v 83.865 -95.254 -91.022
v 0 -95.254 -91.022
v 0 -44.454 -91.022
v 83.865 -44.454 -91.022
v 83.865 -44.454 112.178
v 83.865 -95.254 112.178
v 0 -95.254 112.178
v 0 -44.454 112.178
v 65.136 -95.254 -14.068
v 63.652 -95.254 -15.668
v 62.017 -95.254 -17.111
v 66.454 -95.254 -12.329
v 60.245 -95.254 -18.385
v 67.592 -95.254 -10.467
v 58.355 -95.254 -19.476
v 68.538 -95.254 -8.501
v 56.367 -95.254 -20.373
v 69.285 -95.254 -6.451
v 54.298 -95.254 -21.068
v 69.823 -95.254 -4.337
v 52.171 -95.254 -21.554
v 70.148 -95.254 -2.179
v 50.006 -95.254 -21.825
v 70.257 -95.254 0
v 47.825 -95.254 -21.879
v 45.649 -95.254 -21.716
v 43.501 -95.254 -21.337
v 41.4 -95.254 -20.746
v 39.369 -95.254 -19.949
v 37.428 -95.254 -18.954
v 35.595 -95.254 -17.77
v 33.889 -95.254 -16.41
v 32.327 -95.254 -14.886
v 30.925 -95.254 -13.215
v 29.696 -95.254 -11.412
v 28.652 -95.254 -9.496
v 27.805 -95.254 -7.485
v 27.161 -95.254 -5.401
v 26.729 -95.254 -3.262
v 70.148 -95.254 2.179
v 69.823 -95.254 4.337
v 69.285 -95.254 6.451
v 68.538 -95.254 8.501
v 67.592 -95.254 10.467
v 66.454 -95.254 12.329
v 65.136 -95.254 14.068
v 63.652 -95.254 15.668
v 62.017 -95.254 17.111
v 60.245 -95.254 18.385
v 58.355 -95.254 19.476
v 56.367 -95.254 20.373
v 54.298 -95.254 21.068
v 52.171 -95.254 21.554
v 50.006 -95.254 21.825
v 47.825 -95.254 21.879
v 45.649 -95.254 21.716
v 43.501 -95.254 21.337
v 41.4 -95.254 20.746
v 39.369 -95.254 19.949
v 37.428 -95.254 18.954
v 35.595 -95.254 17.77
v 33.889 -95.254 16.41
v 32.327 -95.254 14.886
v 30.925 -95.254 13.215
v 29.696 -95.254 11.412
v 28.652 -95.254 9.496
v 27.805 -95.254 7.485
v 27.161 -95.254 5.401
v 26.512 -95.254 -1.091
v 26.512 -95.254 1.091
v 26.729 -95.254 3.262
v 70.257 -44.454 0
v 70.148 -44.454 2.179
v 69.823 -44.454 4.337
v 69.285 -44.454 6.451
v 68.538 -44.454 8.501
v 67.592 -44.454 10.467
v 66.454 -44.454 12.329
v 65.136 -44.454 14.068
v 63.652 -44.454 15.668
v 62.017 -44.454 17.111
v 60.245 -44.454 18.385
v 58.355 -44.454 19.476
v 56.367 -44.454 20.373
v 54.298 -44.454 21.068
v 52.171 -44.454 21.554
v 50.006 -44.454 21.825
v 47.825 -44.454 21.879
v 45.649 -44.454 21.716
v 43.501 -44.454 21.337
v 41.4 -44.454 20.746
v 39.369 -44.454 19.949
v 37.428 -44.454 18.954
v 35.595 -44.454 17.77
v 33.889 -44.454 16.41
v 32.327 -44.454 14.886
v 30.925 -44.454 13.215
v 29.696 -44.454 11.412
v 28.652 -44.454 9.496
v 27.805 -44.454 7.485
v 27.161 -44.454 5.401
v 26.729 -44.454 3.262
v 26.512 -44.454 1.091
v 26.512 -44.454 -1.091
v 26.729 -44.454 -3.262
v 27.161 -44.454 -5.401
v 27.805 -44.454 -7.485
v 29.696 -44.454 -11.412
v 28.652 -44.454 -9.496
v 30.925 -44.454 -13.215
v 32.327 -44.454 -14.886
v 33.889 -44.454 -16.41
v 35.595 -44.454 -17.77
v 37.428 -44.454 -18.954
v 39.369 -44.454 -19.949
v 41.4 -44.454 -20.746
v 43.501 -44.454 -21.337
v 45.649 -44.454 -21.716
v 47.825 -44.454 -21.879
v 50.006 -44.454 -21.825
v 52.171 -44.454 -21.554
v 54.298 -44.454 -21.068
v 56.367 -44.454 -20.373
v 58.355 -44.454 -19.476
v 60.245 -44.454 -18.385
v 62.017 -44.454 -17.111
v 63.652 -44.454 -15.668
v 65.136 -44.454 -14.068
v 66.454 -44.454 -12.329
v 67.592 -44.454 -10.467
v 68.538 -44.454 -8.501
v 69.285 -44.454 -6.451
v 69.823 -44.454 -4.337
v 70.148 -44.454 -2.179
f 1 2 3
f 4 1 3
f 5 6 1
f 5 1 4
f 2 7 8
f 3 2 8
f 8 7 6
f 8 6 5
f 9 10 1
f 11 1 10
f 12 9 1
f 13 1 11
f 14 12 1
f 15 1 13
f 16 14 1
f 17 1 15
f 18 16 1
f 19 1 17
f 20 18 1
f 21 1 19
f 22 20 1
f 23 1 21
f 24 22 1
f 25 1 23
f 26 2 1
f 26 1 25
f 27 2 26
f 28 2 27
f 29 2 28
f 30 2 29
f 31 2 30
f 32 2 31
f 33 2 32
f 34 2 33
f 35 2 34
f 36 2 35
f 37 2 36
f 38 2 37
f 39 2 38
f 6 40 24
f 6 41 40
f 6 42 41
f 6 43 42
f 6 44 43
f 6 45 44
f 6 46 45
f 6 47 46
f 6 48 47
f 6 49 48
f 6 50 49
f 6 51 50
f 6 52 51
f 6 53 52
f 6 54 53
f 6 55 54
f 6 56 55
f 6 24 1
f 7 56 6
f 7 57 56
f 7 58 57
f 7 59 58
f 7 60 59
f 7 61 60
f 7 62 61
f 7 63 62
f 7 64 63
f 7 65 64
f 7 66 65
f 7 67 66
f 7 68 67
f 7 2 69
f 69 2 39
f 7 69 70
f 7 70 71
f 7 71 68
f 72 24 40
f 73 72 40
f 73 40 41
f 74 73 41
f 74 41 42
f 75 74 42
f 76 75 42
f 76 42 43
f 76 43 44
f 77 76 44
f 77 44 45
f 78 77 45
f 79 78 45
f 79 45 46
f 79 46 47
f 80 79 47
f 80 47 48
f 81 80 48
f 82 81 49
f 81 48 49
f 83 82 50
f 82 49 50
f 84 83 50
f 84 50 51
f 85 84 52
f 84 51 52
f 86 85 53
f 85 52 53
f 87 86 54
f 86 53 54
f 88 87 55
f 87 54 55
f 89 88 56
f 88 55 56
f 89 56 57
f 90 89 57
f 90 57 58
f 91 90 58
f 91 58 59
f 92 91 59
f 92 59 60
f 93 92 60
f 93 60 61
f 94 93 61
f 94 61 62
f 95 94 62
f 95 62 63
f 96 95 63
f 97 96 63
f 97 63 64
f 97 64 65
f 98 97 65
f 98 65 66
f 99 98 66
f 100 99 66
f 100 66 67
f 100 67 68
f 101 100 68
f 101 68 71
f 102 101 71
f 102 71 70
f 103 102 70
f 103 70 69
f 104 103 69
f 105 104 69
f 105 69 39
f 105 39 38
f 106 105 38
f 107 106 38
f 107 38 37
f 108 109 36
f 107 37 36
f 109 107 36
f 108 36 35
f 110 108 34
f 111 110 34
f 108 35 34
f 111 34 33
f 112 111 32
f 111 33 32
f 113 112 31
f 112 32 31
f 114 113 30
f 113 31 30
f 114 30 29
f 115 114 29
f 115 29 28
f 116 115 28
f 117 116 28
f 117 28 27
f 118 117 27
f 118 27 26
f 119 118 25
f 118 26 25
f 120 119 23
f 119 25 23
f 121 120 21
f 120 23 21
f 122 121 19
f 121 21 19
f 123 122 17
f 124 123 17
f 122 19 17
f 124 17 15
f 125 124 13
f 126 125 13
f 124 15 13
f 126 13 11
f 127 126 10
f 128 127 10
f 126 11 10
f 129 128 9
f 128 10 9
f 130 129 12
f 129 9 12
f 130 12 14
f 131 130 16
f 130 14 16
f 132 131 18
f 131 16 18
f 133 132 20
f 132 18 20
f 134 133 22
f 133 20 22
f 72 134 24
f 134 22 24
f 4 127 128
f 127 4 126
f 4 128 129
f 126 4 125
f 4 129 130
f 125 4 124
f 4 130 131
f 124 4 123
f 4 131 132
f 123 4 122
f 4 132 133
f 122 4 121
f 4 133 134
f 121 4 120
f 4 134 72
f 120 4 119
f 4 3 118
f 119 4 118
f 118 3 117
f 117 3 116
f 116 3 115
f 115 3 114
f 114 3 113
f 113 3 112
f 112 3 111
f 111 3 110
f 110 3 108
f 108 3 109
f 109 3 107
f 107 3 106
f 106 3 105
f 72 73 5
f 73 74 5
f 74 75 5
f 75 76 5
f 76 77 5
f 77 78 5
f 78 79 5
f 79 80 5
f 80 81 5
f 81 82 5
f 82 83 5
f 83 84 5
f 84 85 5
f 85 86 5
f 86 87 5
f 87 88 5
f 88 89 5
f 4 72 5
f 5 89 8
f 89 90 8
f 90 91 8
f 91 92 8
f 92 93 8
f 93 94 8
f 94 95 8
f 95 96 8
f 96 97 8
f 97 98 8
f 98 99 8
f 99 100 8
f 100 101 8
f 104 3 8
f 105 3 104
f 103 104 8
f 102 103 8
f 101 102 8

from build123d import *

# Parameters (mm, degrees)
F0_W     = 50.8
F0_H     = 203.2
F1_DEPTH = 83.865166
F2_R     = 21.886059
F3_DEPTH = 50.801


with BuildPart() as f1:
    # F0 (on Right) → F1 (new body)
    with BuildSketch(Plane.YZ):
        with Locations((-69.854085, 10.577654)):
            Rectangle(F0_W, F0_H)
    extrude(amount=F1_DEPTH)

    # F2 (on face) → F3 (cut, through all)
    with BuildSketch(Plane.XZ.offset(95.254085)):
        with Locations((48.370779, 0)):
            Circle(F2_R)
    extrude(amount=-F3_DEPTH, mode=Mode.SUBTRACT)


solid = f1.part
